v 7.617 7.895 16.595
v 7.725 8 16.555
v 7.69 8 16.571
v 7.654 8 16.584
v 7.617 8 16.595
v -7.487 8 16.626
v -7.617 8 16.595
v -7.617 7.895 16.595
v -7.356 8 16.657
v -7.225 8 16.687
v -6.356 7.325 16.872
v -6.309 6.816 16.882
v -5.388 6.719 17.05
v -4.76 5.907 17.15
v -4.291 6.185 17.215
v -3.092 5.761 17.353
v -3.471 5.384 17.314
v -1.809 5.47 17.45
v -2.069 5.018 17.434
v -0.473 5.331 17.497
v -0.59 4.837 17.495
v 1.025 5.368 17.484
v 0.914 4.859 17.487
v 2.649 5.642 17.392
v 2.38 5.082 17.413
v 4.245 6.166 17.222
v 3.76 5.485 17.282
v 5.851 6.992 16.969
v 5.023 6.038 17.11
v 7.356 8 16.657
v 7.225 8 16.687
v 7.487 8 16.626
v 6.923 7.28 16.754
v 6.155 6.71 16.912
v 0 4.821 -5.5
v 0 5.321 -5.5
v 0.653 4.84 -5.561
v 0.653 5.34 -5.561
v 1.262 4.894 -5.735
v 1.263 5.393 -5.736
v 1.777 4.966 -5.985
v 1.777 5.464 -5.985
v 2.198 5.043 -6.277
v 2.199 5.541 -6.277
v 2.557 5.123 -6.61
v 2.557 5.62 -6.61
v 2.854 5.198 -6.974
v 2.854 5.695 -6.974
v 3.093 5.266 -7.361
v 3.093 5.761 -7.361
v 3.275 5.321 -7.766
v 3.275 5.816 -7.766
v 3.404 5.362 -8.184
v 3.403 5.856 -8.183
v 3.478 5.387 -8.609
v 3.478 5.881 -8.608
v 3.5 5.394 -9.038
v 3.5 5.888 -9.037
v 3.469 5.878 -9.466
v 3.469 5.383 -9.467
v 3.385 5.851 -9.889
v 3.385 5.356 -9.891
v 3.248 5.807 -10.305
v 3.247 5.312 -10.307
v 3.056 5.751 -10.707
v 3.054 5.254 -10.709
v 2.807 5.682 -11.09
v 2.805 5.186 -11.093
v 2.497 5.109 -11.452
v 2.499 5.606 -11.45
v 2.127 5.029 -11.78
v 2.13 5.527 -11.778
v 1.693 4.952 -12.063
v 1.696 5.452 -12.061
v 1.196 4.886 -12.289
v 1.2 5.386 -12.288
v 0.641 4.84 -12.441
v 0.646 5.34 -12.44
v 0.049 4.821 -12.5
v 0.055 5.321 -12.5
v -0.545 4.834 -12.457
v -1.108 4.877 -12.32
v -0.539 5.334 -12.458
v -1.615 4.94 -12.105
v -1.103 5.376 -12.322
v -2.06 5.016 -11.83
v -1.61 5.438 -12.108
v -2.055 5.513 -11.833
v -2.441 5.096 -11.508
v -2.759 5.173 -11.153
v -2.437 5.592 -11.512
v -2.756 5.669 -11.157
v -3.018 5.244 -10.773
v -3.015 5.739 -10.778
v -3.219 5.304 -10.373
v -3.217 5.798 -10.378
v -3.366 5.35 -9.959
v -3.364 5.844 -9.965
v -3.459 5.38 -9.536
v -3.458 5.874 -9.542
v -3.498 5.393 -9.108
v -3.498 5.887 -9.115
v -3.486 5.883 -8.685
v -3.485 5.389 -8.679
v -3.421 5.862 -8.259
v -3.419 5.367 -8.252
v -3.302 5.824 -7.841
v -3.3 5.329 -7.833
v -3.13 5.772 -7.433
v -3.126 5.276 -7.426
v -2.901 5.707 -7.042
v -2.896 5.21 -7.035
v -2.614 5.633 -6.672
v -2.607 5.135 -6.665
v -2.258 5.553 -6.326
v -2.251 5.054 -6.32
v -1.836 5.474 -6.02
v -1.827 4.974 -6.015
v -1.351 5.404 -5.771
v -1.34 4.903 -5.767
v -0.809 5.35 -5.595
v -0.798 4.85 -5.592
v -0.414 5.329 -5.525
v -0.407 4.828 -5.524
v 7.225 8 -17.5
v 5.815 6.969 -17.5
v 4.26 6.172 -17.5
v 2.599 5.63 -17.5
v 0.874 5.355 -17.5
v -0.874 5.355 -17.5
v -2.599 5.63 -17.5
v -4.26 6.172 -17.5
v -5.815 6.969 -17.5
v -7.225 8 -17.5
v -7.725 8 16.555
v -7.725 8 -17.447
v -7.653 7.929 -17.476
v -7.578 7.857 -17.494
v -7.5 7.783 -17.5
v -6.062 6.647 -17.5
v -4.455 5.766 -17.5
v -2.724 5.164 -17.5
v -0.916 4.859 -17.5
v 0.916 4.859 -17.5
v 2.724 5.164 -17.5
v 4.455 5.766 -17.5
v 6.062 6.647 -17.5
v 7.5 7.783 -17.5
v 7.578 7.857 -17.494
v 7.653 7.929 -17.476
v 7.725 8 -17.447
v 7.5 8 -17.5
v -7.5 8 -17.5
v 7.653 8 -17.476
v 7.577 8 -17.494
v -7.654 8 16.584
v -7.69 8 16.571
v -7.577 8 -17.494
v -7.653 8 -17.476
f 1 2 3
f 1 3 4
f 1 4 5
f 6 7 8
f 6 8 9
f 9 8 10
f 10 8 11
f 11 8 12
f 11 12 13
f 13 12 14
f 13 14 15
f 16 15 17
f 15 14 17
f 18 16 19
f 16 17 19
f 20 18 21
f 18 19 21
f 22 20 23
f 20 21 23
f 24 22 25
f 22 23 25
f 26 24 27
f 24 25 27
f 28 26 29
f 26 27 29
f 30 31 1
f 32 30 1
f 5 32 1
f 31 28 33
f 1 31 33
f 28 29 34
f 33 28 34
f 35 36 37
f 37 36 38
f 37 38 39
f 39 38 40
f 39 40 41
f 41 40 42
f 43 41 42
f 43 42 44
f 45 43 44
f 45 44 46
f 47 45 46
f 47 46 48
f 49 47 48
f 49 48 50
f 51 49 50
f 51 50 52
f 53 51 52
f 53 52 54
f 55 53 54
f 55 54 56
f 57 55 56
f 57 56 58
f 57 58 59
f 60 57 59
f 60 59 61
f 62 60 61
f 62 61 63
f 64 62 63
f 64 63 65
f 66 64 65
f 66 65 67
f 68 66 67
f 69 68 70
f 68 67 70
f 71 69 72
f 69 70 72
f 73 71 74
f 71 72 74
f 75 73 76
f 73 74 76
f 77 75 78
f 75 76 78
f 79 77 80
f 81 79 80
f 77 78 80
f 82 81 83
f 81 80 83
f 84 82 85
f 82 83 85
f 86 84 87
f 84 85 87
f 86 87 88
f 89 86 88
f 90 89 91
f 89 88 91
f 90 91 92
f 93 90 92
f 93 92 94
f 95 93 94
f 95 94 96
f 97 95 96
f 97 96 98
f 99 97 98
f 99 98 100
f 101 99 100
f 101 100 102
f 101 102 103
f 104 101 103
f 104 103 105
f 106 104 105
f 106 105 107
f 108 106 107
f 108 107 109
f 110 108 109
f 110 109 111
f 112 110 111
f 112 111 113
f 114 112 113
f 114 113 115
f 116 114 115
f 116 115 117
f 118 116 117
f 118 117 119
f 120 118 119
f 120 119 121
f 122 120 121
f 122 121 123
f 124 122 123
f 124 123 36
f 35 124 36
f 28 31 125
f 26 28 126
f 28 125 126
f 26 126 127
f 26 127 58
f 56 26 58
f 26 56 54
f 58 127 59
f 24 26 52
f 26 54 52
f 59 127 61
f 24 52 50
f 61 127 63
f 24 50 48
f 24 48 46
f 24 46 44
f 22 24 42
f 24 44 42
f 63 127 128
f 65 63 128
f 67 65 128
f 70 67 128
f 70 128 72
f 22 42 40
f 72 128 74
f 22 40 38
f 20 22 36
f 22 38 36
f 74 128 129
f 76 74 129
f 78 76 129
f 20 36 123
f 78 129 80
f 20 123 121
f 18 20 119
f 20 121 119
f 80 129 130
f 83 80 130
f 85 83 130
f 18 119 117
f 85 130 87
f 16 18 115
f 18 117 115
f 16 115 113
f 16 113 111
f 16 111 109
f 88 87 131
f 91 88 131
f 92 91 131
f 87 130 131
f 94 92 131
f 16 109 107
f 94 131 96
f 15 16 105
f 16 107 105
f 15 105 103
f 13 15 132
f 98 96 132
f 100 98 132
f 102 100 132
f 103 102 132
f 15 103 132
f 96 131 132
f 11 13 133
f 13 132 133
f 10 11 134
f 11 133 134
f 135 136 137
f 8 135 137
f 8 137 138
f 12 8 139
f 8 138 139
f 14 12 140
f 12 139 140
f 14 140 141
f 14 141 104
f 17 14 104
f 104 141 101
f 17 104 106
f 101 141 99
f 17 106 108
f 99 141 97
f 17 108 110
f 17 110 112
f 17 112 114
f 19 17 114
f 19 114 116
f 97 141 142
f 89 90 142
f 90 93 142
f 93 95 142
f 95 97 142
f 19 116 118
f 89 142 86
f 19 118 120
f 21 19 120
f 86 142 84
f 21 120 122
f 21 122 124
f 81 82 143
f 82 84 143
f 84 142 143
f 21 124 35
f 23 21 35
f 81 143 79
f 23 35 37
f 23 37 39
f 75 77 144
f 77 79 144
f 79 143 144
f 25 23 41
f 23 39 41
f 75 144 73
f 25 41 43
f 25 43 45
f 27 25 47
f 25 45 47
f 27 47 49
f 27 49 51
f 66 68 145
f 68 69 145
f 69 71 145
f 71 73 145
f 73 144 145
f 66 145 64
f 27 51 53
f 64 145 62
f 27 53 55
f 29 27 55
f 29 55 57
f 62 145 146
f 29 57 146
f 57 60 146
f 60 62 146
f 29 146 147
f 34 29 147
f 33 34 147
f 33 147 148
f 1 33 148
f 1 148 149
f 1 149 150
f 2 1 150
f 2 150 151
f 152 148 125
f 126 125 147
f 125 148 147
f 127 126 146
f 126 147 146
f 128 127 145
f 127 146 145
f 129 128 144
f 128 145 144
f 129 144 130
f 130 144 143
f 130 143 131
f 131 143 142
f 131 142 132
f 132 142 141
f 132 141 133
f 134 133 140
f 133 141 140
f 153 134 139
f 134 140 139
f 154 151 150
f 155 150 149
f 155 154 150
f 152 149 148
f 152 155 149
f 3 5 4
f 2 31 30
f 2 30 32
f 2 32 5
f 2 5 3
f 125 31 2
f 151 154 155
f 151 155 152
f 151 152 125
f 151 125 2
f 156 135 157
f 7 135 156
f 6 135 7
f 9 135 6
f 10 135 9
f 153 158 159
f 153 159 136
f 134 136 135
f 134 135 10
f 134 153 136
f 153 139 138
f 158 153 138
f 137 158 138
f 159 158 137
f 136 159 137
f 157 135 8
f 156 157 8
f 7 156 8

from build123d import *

# Parameters (mm, degrees)
BOSS_EXTRUDE1_DEPTH = 8
FILLET1_R           = 0.5
SKETCH2_R           = 3.5
CUT_EXTRUDE1_DEPTH  = 22.5
SKETCH5_OUTSIDE_W   = 25.862
SKETCH5_OUTSIDE_H   = 17.862
CUT_EXTRUDE2_DEPTH  = 39.5
SKETCH6_OUTSIDE_W   = 25.128
SKETCH6_OUTSIDE_H   = 12.878
CUT_EXTRUDE3_DEPTH  = 39.5


with BuildPart() as part:
    # Sketch1 → Boss-Extrude1 (new body)
    with BuildSketch(Plane(origin=(0, 0, 0), x_dir=(1, 0, 0), z_dir=(0, 1, 0))):
        with BuildLine():
            Line((8, -16.5), (8, 17.5))
            Line((8, 17.5), (-8, 17.5))
            Line((-8, 17.5), (-8, -16.5))
            ThreePointArc((-8, -16.5), (0, -17.5), (8, -16.5))
        make_face()
    extrude(amount=BOSS_EXTRUDE1_DEPTH)

    # Fillet1
    fillet1_edges = [part.edges().sort_by_distance(p)[0] for p in [
        (-8, 4, -17.5),
        (8, 4, -17.5),
        (8, 4, 16.5),
        (-8, 4, 16.5),
    ]]
    fillet(fillet1_edges, radius=FILLET1_R)

    # Sketch2 → Cut-Extrude1 (cut)
    with BuildSketch(Plane(origin=(0, 8, 0), x_dir=(1, 0, 0), z_dir=(0, 1, 0))):
        with Locations(Location((0, 9, 0), (0, 0, 270))):
            Circle(SKETCH2_R)
    extrude(amount=-CUT_EXTRUDE1_DEPTH, mode=Mode.SUBTRACT)

    # Sketch5 outside → Cut-Extrude2 (cut, symmetric)
    with BuildSketch(Plane(origin=(0, 0, -17.5), x_dir=(-1, 0, 0), z_dir=(0, 0, -1))):
        with Locations((0, 4)):
            Rectangle(SKETCH5_OUTSIDE_W, SKETCH5_OUTSIDE_H)
        with BuildLine():
            Line((0, 8), (-7.725, 8))
            ThreePointArc((-7.725, 8), (0, 4.8), (7.725, 8))
            Line((7.725, 8), (0, 8))
        make_face(mode=Mode.SUBTRACT)
    extrude(amount=CUT_EXTRUDE2_DEPTH, both=True, mode=Mode.SUBTRACT)

    # Sketch6 outside → Cut-Extrude3 (cut, symmetric)
    with BuildSketch(Plane(origin=(0, 0, -17.5), x_dir=(-1, 0, 0), z_dir=(0, 0, -1))):
        with Locations((0, 6.4)):
            Rectangle(SKETCH6_OUTSIDE_W, SKETCH6_OUTSIDE_H)
        with BuildLine():
            Line((-7.725, 8), (-7.225, 8))
            ThreePointArc((-7.225, 8), (0, 5.320884761), (7.225, 8))
            Line((7.225, 8), (7.725, 8))
            ThreePointArc((7.725, 8), (0, 4.820884761), (-7.725, 8))
        make_face(mode=Mode.SUBTRACT)
    extrude(amount=CUT_EXTRUDE3_DEPTH, both=True, mode=Mode.SUBTRACT)


solid = part.part
